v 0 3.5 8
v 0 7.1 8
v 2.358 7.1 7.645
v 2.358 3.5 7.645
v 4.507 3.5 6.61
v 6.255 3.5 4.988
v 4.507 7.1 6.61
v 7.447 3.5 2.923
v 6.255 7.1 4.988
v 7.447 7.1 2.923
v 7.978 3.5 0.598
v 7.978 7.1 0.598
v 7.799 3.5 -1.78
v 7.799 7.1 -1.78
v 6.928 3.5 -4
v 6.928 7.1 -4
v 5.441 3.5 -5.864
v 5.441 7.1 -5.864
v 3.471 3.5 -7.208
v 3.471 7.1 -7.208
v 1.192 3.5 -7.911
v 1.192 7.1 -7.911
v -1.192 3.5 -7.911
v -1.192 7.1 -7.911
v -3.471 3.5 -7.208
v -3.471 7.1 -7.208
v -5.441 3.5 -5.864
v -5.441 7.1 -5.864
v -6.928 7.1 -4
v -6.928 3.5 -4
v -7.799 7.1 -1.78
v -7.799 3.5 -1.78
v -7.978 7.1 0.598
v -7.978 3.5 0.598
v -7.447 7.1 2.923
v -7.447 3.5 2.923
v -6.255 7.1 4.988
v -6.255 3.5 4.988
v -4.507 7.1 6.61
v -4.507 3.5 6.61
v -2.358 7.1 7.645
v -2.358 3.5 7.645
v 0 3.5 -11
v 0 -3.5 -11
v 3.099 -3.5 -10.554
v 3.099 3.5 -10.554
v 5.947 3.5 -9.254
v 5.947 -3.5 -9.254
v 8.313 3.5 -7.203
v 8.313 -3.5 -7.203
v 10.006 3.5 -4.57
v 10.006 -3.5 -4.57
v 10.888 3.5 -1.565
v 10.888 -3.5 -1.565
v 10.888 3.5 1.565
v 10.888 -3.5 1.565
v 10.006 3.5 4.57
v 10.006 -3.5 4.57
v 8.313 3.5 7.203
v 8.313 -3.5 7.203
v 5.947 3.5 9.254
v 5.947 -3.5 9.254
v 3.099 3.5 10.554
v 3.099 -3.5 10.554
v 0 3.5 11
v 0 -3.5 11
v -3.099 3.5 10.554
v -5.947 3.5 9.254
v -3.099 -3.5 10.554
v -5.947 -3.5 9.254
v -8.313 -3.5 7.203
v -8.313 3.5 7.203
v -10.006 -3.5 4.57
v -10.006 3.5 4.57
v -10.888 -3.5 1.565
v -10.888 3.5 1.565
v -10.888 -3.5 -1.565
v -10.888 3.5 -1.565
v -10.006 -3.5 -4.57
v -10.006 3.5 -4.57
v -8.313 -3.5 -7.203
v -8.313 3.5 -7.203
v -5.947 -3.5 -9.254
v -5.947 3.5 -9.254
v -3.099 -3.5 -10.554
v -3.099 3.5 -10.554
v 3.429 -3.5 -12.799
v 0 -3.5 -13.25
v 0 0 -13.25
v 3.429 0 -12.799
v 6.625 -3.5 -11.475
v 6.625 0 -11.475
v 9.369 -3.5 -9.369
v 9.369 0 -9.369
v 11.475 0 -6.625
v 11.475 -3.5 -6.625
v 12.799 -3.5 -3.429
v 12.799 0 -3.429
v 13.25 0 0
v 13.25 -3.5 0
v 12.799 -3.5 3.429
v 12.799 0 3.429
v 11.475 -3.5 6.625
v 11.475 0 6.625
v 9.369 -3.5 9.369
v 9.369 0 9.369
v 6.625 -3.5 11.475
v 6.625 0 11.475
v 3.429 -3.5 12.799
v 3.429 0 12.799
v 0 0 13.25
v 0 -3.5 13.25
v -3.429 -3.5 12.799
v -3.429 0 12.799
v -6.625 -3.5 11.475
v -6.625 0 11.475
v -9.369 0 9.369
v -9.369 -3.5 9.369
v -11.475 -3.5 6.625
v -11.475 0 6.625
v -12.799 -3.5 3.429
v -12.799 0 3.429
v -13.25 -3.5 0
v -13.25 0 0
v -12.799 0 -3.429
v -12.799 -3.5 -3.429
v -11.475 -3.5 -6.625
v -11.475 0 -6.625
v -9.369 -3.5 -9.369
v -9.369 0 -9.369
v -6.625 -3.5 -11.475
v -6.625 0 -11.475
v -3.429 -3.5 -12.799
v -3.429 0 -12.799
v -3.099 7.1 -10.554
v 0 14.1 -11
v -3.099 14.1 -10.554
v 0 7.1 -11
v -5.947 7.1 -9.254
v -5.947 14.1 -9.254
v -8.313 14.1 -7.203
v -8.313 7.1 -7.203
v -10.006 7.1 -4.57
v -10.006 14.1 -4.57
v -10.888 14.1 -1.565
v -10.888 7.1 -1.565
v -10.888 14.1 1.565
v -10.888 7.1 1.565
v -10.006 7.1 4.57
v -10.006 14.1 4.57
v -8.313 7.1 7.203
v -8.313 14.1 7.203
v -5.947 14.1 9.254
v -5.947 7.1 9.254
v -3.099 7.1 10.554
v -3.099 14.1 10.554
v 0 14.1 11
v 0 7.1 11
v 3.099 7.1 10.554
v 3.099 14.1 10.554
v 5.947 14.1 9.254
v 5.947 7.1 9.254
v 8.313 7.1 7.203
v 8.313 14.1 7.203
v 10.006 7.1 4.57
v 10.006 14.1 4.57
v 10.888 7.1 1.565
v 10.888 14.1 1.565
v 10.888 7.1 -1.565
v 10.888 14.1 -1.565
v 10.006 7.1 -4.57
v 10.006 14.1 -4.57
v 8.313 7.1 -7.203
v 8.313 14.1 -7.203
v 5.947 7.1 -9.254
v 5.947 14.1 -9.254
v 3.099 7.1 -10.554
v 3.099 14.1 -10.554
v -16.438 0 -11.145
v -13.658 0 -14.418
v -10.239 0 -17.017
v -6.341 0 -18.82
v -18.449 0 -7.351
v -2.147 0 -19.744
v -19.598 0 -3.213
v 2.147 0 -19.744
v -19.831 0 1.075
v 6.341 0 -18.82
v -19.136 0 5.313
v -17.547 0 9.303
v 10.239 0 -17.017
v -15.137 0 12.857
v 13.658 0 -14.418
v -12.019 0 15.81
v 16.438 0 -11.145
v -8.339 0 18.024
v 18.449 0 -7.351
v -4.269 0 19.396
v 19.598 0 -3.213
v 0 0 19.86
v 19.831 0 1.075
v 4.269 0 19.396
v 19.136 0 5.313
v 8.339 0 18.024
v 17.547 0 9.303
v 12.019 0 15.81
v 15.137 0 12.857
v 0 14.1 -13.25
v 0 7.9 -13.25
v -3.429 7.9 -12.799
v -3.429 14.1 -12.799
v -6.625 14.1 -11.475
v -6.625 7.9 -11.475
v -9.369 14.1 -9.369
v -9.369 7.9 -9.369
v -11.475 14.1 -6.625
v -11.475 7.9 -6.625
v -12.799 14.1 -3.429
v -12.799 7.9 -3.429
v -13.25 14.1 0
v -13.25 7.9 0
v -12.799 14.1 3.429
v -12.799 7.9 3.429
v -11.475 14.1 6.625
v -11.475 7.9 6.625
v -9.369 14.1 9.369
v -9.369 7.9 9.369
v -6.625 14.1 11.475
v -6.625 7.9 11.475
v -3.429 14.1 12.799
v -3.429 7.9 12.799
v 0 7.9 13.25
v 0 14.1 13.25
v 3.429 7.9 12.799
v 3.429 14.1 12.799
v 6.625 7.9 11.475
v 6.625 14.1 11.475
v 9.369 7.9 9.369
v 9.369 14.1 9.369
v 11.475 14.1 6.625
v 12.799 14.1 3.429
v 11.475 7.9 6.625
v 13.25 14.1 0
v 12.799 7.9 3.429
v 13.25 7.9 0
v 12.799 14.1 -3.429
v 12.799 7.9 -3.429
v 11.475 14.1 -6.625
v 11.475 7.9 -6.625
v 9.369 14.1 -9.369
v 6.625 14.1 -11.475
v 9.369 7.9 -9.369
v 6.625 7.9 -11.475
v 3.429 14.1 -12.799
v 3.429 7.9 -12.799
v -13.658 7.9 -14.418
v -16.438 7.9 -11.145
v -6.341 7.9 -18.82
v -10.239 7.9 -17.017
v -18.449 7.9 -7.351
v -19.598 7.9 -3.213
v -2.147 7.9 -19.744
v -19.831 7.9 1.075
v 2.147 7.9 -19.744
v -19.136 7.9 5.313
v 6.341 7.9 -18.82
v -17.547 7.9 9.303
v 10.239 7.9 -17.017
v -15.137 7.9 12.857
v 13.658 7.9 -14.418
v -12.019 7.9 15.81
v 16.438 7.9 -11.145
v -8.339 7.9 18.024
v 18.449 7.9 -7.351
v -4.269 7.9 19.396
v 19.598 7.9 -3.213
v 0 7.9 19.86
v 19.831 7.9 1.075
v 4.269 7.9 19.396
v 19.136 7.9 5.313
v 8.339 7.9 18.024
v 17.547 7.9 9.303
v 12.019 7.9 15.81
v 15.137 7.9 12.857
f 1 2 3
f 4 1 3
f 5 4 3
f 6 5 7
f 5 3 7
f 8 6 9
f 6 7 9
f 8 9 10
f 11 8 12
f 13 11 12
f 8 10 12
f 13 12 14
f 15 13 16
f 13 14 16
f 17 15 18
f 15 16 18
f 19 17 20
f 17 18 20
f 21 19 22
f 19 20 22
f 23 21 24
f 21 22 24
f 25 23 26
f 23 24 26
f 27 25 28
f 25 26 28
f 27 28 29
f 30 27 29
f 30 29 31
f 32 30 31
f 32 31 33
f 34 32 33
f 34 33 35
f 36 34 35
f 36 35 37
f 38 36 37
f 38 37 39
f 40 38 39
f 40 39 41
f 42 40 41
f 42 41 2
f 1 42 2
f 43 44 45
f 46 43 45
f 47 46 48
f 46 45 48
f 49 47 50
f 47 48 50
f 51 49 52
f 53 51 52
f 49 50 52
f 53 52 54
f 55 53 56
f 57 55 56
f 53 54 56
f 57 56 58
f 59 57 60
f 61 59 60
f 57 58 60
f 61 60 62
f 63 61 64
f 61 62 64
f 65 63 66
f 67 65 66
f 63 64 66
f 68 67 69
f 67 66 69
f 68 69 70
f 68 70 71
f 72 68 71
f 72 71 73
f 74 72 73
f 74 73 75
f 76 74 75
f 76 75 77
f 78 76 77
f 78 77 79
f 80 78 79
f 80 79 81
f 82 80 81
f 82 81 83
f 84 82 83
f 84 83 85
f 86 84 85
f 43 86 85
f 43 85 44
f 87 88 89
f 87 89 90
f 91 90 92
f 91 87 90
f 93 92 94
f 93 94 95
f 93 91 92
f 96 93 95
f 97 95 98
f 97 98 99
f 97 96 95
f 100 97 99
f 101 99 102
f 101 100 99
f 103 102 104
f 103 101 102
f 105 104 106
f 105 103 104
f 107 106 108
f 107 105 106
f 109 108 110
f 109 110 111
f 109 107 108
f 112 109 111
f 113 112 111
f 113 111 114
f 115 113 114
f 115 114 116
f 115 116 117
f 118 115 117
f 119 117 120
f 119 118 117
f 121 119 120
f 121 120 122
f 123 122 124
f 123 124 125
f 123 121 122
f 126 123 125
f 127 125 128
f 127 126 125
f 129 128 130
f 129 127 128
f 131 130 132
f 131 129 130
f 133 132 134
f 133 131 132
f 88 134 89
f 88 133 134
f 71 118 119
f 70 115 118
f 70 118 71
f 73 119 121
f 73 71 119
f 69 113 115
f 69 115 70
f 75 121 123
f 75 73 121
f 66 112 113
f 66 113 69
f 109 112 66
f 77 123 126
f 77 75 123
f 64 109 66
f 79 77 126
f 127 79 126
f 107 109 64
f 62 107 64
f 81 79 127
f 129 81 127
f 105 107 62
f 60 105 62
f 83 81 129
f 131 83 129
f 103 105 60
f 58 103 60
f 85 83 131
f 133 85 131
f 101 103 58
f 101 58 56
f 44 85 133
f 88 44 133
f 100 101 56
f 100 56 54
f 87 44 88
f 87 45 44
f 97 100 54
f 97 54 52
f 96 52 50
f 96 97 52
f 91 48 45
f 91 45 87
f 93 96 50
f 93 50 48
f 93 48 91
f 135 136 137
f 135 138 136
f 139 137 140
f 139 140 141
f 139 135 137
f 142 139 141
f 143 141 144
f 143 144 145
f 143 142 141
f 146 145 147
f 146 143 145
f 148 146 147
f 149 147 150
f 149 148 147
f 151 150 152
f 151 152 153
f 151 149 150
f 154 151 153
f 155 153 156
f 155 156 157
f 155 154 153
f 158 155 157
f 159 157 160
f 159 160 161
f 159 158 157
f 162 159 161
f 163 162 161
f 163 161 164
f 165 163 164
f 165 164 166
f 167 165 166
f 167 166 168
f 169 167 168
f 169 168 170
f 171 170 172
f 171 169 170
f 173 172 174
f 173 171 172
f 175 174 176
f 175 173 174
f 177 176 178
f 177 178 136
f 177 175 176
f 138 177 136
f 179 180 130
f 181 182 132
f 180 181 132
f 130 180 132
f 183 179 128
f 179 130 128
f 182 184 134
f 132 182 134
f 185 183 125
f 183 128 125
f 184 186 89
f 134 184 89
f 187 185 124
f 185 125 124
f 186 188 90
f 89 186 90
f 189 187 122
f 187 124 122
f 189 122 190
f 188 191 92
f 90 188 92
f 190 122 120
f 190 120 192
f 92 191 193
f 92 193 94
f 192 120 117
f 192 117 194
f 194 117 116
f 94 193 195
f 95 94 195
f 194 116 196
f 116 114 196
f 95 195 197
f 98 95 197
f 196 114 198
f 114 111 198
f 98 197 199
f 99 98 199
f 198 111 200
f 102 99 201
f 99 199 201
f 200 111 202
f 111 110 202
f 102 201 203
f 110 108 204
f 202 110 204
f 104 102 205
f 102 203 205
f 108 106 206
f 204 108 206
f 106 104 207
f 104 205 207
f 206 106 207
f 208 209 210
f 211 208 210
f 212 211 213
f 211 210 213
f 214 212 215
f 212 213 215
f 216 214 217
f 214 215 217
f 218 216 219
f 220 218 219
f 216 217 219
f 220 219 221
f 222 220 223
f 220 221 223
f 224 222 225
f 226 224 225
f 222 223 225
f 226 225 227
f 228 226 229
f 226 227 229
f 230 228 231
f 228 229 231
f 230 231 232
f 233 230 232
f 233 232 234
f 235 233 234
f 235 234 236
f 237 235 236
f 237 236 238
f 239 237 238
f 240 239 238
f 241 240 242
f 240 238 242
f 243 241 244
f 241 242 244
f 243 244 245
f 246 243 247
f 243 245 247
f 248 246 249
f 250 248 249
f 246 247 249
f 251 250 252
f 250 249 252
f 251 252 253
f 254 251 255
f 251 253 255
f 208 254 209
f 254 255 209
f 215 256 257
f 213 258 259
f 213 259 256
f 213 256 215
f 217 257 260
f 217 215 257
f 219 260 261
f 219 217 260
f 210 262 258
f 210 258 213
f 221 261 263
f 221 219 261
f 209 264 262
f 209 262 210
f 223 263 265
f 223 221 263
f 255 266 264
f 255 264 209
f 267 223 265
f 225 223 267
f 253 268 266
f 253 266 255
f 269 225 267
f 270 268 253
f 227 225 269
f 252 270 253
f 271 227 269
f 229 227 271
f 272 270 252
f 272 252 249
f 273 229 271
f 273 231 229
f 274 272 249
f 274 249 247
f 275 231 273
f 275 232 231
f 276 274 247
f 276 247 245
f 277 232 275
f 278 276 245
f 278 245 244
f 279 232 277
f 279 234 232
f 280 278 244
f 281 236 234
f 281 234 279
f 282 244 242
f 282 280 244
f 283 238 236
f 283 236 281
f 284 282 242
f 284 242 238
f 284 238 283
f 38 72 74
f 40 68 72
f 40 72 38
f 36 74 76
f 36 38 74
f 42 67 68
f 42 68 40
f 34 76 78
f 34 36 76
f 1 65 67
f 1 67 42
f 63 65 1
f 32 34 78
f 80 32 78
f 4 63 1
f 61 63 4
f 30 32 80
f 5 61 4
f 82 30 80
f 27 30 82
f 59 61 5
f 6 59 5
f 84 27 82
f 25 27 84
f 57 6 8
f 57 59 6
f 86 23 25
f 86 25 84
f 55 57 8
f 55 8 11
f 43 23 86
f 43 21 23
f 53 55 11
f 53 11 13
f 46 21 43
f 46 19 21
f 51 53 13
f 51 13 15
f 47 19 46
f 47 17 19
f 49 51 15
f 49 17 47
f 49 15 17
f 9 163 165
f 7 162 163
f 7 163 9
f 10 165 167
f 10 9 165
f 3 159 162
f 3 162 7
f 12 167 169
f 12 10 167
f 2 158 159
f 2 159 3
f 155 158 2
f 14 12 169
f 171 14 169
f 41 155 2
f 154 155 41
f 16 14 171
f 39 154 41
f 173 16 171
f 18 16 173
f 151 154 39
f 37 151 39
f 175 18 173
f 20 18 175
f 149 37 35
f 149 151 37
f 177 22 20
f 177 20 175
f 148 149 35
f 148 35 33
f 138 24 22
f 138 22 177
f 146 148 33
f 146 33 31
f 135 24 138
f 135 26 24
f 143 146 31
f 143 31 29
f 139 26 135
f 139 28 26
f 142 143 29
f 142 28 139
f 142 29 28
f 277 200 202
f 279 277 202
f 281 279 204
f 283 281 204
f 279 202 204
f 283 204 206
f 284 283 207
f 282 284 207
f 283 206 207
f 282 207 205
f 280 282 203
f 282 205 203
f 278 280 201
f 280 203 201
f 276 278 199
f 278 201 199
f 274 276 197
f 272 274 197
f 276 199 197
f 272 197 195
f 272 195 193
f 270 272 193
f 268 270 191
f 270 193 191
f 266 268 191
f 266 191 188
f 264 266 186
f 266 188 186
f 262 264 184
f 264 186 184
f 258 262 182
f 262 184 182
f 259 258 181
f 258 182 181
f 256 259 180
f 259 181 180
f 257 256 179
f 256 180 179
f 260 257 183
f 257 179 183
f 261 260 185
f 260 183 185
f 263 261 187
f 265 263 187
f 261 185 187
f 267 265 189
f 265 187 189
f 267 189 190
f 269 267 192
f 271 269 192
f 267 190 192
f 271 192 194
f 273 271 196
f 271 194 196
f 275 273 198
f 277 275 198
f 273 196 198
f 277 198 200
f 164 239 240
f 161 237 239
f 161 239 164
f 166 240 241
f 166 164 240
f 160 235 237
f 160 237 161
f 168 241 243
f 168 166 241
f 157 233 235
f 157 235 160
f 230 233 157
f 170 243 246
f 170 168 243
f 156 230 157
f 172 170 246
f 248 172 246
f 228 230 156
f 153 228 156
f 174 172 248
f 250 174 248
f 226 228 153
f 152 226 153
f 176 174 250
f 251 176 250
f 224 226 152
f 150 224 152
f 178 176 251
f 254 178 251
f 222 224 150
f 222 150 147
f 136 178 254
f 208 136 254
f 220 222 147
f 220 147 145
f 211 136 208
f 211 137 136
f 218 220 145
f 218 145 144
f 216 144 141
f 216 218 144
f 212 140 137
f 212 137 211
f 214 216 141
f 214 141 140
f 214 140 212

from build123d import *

# Parameters (mm, degrees)
CROQUIS1_R              = 19.86
SALIENTE_EXTRUIR1_DEPTH = 7.9
CROQUIS2_R              = 8
CORTAR_EXTRUIR1_DEPTH   = 7.9
CROQUIS3_R              = 13.25
CROQUIS3_R_2            = 11
SALIENTE_EXTRUIR2_DEPTH = 6.2
SALIENTE_EXTRUIR3_START = 3.5
CROQUIS4_R              = 13.25
CROQUIS4_R_2            = 11
SALIENTE_EXTRUIR3_DEPTH = 3.5
CROQUIS5_R              = 11
CORTAR_EXTRUIR2_DEPTH   = 7
CORTAR_EXTRUIR3_START   = -7
CROQUIS6_R              = 11
CORTAR_EXTRUIR3_DEPTH   = 7


with BuildPart() as part:
    # Croquis1 → Saliente-Extruir1 (new body)
    with BuildSketch(Plane(origin=(0, 0, 0), x_dir=(1, 0, 0), z_dir=(0, 1, 0))):
        with Locations(Location((0, 0, 0), (0, 0, 270))):
            Circle(CROQUIS1_R)
    extrude(amount=SALIENTE_EXTRUIR1_DEPTH)

    # Croquis2 → Cortar-Extruir1 (cut)
    with BuildSketch(Plane(origin=(0, 7.9, 0), x_dir=(1, 0, 0), z_dir=(0, 1, 0))):
        with Locations(Location((0, 0, 0), (0, 0, 270))):
            Circle(CROQUIS2_R)
    extrude(amount=-CORTAR_EXTRUIR1_DEPTH, mode=Mode.SUBTRACT)

    # Croquis3 → Saliente-Extruir2 (add)
    with BuildSketch(Plane(origin=(0, 7.9, 0), x_dir=(1, 0, 0), z_dir=(0, 1, 0))):
        with Locations(Location((0, 0, 0), (0, 0, 90))):
            Circle(CROQUIS3_R)
        with Locations(Location((0, 0, 0), (0, 0, 90))):
            Circle(CROQUIS3_R_2, mode=Mode.SUBTRACT)
    extrude(amount=SALIENTE_EXTRUIR2_DEPTH)

    # Croquis4 → Saliente-Extruir3 (add)
    with BuildSketch(Plane.XZ.offset(SALIENTE_EXTRUIR3_START)):
        with Locations(Location((0, 0, 0), (0, 0, 270))):
            Circle(CROQUIS4_R)
        with Locations(Location((0, 0, 0), (0, 0, 270))):
            Circle(CROQUIS4_R_2, mode=Mode.SUBTRACT)
    extrude(amount=-SALIENTE_EXTRUIR3_DEPTH)

    # Croquis5 → Cortar-Extruir2 (cut)
    with BuildSketch(Plane.XZ.offset(3.5)):
        with Locations(Location((0, 0, 0), (0, 0, 270))):
            Circle(CROQUIS5_R)
    extrude(amount=-CORTAR_EXTRUIR2_DEPTH, mode=Mode.SUBTRACT)

    # Croquis6 → Cortar-Extruir3 (cut)
    with BuildSketch(Plane(origin=(0, 14.1, 0), x_dir=(1, 0, 0), z_dir=(0, 1, 0)).offset(CORTAR_EXTRUIR3_START)):
        with Locations(Location((0, 0, 0), (0, 0, 90))):
            Circle(CROQUIS6_R)
    extrude(amount=CORTAR_EXTRUIR3_DEPTH, mode=Mode.SUBTRACT)


solid = part.part
